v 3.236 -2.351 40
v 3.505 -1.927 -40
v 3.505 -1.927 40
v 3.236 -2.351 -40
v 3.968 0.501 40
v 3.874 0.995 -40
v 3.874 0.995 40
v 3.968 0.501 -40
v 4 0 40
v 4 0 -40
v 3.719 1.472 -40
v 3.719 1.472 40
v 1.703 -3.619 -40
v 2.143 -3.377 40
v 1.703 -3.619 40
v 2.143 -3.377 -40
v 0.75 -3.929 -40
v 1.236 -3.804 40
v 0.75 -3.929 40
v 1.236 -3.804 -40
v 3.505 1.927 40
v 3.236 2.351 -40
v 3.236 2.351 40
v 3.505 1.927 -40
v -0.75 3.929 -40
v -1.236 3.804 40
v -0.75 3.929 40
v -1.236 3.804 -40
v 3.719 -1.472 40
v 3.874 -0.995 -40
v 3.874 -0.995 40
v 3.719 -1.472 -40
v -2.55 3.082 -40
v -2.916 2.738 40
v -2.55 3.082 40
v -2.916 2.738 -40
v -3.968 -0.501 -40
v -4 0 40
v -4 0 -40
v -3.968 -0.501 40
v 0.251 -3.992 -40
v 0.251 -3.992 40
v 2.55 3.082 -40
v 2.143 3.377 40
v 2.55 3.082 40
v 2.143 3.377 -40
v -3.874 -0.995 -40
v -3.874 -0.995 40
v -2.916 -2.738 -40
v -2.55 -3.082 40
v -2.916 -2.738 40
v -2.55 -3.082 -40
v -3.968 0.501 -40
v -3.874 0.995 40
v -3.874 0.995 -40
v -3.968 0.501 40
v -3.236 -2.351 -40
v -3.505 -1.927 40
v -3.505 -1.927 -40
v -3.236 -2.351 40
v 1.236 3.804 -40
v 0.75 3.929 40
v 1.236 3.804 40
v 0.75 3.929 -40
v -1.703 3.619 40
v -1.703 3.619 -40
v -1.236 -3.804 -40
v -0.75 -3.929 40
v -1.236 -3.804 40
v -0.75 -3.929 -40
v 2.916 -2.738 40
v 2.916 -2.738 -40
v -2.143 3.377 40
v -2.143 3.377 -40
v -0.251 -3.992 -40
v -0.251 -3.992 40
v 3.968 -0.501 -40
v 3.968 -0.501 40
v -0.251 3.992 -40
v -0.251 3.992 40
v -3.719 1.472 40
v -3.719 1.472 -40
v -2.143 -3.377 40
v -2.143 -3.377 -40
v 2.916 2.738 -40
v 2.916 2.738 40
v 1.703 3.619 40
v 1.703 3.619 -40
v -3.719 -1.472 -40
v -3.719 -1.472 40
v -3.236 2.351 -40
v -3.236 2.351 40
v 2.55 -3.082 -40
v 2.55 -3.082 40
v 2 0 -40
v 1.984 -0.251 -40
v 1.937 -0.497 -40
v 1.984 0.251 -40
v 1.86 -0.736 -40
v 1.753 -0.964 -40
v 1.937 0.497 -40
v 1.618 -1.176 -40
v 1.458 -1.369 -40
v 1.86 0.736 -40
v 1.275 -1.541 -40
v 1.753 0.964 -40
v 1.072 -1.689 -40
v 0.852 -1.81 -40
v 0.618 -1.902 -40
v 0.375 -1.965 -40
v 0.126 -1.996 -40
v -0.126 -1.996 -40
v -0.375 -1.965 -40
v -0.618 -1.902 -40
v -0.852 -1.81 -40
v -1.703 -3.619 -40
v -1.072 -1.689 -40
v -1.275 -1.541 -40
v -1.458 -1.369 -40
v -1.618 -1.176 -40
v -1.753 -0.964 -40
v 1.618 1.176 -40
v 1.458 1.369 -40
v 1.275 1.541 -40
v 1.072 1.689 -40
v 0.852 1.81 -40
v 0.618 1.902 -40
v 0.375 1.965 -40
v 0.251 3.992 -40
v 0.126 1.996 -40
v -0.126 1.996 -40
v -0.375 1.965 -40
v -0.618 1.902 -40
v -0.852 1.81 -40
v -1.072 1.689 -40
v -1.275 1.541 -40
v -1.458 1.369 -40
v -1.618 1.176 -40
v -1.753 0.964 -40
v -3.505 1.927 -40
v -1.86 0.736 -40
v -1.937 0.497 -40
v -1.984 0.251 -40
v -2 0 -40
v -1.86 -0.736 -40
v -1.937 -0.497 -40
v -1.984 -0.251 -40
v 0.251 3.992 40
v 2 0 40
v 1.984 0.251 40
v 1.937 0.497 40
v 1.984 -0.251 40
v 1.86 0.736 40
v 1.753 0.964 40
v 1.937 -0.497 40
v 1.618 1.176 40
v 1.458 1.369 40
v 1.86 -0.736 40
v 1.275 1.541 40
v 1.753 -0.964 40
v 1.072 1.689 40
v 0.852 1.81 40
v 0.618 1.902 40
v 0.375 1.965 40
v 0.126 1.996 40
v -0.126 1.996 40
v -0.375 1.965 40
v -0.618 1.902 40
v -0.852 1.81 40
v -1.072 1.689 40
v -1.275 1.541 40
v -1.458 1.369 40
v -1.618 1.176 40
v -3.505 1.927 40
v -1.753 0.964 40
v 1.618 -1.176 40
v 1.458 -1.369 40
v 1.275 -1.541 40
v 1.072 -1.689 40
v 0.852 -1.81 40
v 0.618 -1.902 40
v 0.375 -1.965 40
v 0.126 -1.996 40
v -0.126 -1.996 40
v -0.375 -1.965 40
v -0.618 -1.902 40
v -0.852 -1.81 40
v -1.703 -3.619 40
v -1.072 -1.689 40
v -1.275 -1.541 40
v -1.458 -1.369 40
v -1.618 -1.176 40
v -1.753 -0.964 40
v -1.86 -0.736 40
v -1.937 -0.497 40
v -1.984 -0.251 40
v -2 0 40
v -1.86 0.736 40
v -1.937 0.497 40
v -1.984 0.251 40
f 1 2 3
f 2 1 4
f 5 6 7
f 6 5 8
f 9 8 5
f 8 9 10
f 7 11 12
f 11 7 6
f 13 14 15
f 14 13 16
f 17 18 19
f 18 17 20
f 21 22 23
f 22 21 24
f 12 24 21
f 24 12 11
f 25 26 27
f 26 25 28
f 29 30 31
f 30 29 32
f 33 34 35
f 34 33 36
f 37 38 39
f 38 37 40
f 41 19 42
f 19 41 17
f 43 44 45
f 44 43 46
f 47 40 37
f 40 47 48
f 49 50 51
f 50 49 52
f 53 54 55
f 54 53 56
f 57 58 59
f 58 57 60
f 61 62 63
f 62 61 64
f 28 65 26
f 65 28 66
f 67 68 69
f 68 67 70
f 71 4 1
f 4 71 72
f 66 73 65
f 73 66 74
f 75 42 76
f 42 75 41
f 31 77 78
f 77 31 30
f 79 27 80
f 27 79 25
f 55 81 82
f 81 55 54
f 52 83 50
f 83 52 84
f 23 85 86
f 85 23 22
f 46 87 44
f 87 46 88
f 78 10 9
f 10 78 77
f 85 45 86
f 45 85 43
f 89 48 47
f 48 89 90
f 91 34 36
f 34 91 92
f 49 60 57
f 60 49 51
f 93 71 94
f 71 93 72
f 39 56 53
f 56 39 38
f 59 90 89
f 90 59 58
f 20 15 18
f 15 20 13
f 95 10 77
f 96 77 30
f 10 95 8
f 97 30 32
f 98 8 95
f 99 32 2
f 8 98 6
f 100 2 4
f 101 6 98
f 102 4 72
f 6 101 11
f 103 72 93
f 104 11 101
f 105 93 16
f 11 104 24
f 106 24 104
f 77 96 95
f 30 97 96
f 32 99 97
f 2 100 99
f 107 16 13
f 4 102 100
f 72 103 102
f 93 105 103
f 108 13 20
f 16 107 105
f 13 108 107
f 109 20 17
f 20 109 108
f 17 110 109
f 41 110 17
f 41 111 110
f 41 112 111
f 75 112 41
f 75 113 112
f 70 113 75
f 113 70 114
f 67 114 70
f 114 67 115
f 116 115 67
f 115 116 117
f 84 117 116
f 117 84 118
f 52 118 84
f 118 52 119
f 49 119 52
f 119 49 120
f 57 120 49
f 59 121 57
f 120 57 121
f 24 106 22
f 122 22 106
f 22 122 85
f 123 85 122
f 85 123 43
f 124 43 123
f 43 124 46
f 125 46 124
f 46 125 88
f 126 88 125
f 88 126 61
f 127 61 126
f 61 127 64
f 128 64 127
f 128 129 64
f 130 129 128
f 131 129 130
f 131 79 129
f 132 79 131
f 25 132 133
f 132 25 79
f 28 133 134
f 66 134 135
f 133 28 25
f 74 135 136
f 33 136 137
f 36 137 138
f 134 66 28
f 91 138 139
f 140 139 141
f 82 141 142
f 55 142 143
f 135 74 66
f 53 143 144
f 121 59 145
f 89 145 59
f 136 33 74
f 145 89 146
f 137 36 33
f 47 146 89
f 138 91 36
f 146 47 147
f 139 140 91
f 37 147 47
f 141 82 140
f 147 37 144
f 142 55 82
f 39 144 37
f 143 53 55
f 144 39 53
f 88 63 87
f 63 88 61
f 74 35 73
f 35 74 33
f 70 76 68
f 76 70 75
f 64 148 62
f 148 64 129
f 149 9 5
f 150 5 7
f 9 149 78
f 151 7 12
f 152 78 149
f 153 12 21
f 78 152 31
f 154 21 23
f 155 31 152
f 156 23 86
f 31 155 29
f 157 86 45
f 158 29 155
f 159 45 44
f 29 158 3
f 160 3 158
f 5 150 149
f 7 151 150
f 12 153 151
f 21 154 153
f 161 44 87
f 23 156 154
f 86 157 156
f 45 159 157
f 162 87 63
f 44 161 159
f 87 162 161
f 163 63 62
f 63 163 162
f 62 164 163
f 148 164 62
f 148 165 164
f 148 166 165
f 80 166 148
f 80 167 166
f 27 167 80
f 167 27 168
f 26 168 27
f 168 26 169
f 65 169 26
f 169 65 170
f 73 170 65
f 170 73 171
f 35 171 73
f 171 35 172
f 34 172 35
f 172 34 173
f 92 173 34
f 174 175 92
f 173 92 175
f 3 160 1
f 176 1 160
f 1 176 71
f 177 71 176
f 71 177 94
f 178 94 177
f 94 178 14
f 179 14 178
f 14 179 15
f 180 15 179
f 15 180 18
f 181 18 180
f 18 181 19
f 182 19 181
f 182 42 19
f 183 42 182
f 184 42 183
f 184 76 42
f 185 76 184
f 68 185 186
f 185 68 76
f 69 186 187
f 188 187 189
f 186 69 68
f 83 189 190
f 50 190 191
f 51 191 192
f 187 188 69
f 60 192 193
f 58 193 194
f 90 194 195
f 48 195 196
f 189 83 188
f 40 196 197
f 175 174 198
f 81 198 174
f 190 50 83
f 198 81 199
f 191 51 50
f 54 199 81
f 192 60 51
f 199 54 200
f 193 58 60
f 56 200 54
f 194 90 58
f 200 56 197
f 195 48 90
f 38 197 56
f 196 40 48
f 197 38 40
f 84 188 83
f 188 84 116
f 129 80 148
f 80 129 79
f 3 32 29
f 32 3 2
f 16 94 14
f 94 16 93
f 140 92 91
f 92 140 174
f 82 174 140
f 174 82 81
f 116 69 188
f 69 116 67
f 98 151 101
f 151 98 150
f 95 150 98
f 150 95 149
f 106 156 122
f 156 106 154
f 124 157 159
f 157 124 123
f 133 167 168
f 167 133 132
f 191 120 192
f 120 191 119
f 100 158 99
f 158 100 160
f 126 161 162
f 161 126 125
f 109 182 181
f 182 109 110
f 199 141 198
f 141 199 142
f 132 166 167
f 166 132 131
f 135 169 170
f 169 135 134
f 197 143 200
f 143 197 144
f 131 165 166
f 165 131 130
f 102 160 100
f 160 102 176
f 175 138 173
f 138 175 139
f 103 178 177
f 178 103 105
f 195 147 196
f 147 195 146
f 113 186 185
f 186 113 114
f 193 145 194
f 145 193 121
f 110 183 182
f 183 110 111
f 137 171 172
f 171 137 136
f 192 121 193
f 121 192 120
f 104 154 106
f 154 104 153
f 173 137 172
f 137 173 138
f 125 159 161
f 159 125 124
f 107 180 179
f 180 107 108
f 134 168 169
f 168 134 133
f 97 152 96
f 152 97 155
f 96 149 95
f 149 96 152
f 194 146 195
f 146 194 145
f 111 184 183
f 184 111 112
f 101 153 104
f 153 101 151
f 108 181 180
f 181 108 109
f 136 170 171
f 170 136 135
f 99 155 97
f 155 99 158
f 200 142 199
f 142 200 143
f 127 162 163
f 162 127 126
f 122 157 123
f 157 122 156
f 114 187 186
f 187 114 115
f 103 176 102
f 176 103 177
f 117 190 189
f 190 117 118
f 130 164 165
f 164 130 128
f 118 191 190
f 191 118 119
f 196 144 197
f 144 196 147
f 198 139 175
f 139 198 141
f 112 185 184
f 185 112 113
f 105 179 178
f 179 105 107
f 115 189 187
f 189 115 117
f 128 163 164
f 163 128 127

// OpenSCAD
$fn = 50;


difference() {
	union() {
		translate(v = [0, 0, -40.0000000000]) {
			cylinder(h = 80, r = 4.0000000000);
		}
	}
	union() {
		translate(v = [0, 0, -100.0000000000]) {
			cylinder(h = 200, r = 2.0000000000);
		}
	}
}
